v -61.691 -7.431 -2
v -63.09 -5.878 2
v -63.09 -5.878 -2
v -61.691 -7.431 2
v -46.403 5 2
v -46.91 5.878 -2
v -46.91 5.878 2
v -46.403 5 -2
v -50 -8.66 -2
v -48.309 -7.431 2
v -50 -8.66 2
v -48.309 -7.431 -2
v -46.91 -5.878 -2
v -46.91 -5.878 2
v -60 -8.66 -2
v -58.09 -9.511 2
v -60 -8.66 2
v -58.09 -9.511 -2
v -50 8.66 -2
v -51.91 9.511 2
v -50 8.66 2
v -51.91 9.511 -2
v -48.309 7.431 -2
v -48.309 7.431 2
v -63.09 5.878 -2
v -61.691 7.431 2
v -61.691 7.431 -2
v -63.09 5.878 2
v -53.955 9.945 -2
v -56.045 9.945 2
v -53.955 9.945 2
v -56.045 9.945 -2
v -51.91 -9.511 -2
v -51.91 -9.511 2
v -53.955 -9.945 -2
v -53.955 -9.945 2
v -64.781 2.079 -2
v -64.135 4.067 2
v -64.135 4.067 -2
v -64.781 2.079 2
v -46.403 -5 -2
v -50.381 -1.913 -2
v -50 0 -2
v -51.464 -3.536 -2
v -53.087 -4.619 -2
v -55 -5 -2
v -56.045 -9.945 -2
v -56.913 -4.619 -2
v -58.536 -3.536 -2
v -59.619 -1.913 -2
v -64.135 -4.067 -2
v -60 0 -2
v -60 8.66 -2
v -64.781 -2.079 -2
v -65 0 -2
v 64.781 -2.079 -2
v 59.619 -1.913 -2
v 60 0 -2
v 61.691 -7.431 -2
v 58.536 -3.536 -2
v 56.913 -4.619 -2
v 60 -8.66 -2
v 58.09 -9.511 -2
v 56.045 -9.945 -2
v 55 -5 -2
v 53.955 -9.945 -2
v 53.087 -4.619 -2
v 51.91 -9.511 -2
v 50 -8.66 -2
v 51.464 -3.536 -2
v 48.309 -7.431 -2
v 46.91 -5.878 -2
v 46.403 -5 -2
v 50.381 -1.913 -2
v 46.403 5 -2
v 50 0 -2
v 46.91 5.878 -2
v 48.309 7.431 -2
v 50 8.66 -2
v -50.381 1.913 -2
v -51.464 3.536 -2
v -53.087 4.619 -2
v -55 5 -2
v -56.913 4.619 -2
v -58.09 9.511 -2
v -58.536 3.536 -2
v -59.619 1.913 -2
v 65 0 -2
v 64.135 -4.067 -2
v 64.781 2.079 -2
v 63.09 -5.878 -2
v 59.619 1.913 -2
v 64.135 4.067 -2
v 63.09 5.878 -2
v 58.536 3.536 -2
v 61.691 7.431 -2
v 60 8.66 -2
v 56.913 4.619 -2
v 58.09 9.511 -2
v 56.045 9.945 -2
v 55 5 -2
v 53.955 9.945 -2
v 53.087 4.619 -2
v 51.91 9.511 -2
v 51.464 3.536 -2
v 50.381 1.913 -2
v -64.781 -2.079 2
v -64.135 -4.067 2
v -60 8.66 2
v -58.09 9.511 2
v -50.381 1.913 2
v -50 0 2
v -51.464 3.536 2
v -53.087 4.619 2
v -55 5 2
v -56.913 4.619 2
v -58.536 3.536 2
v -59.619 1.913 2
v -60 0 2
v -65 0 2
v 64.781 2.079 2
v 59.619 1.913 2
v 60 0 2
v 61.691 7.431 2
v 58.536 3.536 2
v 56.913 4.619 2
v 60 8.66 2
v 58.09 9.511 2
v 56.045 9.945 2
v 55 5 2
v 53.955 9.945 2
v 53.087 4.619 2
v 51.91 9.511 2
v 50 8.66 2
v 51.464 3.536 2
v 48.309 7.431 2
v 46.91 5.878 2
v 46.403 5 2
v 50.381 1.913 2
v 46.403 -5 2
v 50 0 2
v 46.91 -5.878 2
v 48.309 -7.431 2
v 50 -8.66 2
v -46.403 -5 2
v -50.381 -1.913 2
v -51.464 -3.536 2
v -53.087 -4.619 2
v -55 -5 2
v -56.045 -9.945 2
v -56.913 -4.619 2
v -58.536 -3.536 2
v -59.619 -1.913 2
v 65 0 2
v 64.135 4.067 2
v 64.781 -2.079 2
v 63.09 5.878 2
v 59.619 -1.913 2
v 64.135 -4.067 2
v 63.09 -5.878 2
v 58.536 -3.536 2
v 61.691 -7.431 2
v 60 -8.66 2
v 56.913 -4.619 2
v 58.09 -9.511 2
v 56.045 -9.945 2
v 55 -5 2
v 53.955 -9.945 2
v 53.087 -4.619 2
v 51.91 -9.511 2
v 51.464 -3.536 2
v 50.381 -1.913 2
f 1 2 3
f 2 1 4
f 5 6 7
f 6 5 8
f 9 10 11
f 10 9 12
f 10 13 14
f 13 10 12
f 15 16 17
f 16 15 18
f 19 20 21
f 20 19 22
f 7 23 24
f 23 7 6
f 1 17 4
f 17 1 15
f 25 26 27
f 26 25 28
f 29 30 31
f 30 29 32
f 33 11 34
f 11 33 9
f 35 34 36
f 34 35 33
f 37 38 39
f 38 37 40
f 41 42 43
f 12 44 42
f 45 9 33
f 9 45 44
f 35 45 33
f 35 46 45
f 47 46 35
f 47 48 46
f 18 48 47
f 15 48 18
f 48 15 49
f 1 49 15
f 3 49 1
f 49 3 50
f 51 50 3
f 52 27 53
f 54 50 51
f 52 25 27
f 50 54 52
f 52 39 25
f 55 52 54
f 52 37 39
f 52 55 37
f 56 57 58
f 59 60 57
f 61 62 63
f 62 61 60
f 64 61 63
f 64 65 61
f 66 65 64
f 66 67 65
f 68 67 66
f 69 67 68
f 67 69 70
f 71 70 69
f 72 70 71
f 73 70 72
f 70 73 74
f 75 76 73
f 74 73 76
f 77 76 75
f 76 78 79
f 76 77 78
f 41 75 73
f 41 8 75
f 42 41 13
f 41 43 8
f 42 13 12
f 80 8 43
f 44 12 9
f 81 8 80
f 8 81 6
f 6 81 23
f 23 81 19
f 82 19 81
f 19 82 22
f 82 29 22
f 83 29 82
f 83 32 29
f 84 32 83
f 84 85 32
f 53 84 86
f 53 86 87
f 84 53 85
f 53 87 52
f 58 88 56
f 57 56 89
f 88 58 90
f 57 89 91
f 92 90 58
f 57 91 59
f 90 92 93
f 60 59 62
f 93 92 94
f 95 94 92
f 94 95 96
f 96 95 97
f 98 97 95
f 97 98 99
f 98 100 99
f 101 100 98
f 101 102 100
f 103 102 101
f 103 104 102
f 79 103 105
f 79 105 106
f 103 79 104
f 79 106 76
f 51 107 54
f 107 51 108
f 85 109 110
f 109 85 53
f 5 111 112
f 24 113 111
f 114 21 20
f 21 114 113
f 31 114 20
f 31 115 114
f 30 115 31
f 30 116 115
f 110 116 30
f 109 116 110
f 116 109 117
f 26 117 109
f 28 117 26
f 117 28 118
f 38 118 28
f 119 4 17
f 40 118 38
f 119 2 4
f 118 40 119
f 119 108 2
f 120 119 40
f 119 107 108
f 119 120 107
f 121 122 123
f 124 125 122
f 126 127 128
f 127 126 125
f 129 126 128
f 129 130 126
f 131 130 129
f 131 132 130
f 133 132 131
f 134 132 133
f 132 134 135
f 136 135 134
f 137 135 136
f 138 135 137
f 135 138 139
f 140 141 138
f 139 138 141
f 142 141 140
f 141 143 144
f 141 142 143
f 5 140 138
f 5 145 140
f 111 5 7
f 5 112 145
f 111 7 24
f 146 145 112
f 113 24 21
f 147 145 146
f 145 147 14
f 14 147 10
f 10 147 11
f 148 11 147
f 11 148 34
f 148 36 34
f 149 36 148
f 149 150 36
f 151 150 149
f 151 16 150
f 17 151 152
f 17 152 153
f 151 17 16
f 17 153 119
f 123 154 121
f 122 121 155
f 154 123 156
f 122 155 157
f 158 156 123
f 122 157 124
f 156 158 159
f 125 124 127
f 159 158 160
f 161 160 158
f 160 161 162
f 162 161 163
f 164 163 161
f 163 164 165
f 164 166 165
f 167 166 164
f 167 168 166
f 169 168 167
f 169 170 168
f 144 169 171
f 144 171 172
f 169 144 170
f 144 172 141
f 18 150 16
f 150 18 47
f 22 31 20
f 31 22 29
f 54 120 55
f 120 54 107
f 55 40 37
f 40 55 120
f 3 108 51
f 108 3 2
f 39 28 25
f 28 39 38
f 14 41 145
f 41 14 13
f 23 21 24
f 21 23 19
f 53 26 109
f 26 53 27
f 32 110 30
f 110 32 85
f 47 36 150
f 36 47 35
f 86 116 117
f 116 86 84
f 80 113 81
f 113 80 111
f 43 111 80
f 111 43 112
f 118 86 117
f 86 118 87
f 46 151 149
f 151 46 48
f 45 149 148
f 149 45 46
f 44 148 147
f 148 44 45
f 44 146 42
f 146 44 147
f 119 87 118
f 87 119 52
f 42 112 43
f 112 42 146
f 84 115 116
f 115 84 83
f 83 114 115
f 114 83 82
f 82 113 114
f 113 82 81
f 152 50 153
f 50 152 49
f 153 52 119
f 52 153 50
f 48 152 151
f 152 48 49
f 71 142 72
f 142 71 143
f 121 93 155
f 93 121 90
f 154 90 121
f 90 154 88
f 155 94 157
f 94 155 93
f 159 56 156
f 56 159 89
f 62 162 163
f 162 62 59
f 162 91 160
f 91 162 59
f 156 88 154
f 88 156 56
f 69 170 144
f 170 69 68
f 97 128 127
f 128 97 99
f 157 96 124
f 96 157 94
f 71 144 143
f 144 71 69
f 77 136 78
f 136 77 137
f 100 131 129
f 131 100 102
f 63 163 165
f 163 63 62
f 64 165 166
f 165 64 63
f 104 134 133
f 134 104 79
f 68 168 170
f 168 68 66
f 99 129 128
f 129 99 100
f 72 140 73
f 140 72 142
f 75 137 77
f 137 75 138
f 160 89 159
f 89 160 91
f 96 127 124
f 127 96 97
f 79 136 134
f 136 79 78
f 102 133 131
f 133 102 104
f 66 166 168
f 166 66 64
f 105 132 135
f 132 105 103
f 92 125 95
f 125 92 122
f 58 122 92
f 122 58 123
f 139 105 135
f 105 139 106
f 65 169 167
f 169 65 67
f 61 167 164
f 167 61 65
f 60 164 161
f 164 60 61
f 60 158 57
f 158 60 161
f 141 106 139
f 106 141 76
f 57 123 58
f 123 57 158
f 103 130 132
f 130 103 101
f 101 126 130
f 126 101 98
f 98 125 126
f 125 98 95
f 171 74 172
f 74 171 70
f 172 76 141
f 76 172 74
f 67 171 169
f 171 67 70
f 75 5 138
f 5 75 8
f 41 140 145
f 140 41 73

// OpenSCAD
//A simple arm object that can be parameterised for use in the Scott-Russel mechanism
//Alexander Hosford
//alexanderhosford@gmail.com
//November 2013

//default dimensions for an arm
arm_length = 100;
arm_height = 10;
arm_thickness = 4;

module center_arm() {
	cube([arm_length, arm_height, arm_thickness],center=true);
}

module end_ring() {
	difference() {
		cylinder(r=10,h=arm_thickness,center=true);
		cylinder(r=5,h=arm_thickness+1,center=true);
	}
}

module arm(a_l=arm_length,a_h=arm_height,a_t=arm_thickness) {
	union(){
		center_arm();
		
		translate([-((a_l/2)+5),0,0])
		end_ring();

		translate([(a_l/2)+5,0,0])
		end_ring();
	}
}

arm();
